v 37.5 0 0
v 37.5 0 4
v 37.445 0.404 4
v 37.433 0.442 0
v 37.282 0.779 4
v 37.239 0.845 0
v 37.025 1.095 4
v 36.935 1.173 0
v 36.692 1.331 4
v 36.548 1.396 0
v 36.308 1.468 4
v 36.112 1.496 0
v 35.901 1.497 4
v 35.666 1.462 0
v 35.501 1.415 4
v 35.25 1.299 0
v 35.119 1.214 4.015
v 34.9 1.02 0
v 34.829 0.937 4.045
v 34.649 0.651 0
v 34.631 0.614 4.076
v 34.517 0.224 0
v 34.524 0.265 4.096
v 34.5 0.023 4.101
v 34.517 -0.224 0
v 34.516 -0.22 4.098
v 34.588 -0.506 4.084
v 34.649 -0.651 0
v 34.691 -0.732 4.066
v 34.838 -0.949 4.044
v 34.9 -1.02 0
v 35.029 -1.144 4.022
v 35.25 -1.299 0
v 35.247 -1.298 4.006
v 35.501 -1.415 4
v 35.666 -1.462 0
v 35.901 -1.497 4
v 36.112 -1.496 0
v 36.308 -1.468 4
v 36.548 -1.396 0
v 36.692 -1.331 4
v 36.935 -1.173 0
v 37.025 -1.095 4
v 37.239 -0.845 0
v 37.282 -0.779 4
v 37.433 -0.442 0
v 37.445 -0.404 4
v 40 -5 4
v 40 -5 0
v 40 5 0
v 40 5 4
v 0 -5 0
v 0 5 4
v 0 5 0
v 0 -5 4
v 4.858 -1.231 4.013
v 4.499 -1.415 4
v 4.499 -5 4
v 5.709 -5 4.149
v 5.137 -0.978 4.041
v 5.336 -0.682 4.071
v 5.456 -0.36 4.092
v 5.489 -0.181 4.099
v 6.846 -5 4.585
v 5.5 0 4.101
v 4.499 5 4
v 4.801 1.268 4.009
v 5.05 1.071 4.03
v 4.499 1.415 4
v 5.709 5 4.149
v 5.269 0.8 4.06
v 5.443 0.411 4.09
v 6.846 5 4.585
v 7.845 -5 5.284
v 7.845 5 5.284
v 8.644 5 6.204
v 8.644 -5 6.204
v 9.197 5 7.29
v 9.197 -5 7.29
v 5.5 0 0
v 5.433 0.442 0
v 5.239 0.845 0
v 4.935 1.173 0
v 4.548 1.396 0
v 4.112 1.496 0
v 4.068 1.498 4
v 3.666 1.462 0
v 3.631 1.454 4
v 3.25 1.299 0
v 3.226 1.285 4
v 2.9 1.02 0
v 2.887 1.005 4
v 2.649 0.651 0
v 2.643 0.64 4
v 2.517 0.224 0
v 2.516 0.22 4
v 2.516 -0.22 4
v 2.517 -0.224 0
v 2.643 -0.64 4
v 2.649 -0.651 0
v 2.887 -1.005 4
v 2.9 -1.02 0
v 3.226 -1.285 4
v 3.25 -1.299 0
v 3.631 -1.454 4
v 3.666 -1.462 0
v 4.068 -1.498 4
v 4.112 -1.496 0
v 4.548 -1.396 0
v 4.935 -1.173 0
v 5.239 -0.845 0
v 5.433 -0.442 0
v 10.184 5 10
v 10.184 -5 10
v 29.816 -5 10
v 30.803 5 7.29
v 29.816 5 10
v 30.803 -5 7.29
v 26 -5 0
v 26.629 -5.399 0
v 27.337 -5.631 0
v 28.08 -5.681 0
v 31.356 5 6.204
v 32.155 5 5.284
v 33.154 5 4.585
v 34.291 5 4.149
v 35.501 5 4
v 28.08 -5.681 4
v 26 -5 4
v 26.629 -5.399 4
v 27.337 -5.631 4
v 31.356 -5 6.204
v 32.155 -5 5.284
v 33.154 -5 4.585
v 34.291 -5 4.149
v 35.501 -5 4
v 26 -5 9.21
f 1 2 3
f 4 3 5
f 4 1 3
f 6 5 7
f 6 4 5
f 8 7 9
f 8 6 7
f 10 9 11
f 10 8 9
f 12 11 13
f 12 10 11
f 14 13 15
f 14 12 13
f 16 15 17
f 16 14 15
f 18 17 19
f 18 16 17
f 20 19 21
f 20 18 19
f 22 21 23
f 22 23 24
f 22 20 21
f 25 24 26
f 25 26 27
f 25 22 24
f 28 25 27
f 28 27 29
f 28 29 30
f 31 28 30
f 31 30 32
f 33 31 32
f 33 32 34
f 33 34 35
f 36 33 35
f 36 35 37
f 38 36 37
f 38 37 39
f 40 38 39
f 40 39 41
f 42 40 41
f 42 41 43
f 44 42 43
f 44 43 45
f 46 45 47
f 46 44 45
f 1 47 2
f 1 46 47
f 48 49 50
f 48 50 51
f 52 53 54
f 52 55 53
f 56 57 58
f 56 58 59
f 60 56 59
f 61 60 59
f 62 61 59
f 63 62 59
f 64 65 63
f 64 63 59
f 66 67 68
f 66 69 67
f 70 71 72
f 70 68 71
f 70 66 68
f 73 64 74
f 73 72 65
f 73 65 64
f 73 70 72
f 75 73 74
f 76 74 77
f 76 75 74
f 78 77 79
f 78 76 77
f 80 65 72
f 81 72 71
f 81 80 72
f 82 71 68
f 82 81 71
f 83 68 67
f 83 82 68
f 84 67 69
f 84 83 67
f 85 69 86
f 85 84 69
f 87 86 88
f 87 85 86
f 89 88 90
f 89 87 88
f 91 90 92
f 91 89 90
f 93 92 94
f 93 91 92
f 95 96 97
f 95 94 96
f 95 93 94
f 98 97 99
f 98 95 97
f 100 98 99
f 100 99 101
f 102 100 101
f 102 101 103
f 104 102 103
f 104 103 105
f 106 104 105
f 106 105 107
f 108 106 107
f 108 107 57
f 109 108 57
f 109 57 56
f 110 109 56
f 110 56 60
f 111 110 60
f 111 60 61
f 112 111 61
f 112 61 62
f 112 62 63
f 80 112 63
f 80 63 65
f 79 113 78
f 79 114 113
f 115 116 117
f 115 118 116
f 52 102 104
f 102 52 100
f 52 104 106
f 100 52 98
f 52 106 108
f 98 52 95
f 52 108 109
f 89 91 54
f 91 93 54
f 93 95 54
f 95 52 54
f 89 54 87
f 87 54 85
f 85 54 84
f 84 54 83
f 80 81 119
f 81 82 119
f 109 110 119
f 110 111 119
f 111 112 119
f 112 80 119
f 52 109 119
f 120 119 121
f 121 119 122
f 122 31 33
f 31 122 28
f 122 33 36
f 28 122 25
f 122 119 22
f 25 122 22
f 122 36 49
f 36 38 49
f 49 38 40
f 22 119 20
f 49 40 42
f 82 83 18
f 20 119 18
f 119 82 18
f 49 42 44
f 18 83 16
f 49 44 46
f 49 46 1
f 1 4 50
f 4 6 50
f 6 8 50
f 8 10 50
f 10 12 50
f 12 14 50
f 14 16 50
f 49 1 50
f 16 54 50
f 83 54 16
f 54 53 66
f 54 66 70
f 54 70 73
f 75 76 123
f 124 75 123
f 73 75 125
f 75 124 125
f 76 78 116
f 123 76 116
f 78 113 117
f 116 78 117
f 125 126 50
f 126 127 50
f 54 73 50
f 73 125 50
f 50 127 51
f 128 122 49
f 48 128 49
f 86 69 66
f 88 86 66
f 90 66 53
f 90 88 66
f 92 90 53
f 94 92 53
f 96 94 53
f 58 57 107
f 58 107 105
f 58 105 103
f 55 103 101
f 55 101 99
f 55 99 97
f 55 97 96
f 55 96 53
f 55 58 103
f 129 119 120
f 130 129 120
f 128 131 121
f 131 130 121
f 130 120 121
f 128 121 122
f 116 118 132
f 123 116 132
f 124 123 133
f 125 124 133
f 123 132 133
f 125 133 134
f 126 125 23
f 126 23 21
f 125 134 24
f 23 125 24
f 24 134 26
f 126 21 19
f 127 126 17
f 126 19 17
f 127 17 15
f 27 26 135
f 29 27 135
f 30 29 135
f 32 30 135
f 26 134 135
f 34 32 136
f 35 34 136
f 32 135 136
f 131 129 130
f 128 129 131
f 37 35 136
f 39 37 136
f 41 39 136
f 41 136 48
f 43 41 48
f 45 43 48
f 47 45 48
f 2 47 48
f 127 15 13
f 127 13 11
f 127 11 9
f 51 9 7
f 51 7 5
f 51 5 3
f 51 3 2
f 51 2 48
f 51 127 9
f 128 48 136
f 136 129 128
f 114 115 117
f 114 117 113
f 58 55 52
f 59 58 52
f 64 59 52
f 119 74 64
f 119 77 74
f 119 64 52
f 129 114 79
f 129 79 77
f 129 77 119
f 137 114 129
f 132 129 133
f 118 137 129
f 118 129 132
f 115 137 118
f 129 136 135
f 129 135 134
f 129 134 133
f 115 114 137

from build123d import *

# Parameters (mm, degrees)
F1_DEPTH    = 5
F2_R        = 5
F3_R        = 1.5
F4_DEPTH    = 25
F6_DEPTH    = 4
F7_T1_DEPTH = 14.4192067173


# Not quite as in the source:
# - a fillet or chamfer that OpenCascade refuses, or shapes differently, is made with other operations: its cross-section is extruded or revolved along the edge and cut away or added


with BuildPart() as f1:
    # F0 (on Front) → F1 (new body, symmetric)
    with BuildSketch(Plane.XZ):
        Polygon((0, 4), (0, 0), (40, 0), (40, 4), (32, 4), (29.8161785944, 10), (10.1838214056, 10), (8, 4), align=None)
    extrude(amount=F1_DEPTH, both=True)

    # F2
    f2_edges = [f1.edges().sort_by_distance(p)[0] for p in [
        (32, 0, 4),
        (8, 0, 4),
    ]]
    fillet(f2_edges, radius=F2_R)

    # F3 (on Top) → F4 (cut)
    with BuildSketch(Plane.XY):
        with Locations((4, 0)):
            Circle(F3_R)
        with Locations((36, 0)):
            Circle(F3_R)
    extrude(amount=F4_DEPTH, mode=Mode.SUBTRACT)

    # F5 (on Top) → F6 (join)
    with BuildSketch(Plane.XY):
        Polygon((26, -5.8), (40, -5), (26, -5), align=None)
    extrude(amount=F6_DEPTH)

    # F7: fillet of radius 3 on 1 edges, made by hand

    # F7_s2 → F7_t1 (cut)
    with BuildSketch(Plane.XY.offset(-5.2096033586)):
        with BuildLine():
            ThreePointArc((26, -5), (26.9758794109, -5.5370959816), (28.0804474628, -5.6811172878))
            Line((28.0804474628, -5.6811172878), (26, -5.8))
            Line((26, -5.8), (26, -5))
        make_face()
    extrude(amount=F7_T1_DEPTH, mode=Mode.SUBTRACT)


solid = f1.part
